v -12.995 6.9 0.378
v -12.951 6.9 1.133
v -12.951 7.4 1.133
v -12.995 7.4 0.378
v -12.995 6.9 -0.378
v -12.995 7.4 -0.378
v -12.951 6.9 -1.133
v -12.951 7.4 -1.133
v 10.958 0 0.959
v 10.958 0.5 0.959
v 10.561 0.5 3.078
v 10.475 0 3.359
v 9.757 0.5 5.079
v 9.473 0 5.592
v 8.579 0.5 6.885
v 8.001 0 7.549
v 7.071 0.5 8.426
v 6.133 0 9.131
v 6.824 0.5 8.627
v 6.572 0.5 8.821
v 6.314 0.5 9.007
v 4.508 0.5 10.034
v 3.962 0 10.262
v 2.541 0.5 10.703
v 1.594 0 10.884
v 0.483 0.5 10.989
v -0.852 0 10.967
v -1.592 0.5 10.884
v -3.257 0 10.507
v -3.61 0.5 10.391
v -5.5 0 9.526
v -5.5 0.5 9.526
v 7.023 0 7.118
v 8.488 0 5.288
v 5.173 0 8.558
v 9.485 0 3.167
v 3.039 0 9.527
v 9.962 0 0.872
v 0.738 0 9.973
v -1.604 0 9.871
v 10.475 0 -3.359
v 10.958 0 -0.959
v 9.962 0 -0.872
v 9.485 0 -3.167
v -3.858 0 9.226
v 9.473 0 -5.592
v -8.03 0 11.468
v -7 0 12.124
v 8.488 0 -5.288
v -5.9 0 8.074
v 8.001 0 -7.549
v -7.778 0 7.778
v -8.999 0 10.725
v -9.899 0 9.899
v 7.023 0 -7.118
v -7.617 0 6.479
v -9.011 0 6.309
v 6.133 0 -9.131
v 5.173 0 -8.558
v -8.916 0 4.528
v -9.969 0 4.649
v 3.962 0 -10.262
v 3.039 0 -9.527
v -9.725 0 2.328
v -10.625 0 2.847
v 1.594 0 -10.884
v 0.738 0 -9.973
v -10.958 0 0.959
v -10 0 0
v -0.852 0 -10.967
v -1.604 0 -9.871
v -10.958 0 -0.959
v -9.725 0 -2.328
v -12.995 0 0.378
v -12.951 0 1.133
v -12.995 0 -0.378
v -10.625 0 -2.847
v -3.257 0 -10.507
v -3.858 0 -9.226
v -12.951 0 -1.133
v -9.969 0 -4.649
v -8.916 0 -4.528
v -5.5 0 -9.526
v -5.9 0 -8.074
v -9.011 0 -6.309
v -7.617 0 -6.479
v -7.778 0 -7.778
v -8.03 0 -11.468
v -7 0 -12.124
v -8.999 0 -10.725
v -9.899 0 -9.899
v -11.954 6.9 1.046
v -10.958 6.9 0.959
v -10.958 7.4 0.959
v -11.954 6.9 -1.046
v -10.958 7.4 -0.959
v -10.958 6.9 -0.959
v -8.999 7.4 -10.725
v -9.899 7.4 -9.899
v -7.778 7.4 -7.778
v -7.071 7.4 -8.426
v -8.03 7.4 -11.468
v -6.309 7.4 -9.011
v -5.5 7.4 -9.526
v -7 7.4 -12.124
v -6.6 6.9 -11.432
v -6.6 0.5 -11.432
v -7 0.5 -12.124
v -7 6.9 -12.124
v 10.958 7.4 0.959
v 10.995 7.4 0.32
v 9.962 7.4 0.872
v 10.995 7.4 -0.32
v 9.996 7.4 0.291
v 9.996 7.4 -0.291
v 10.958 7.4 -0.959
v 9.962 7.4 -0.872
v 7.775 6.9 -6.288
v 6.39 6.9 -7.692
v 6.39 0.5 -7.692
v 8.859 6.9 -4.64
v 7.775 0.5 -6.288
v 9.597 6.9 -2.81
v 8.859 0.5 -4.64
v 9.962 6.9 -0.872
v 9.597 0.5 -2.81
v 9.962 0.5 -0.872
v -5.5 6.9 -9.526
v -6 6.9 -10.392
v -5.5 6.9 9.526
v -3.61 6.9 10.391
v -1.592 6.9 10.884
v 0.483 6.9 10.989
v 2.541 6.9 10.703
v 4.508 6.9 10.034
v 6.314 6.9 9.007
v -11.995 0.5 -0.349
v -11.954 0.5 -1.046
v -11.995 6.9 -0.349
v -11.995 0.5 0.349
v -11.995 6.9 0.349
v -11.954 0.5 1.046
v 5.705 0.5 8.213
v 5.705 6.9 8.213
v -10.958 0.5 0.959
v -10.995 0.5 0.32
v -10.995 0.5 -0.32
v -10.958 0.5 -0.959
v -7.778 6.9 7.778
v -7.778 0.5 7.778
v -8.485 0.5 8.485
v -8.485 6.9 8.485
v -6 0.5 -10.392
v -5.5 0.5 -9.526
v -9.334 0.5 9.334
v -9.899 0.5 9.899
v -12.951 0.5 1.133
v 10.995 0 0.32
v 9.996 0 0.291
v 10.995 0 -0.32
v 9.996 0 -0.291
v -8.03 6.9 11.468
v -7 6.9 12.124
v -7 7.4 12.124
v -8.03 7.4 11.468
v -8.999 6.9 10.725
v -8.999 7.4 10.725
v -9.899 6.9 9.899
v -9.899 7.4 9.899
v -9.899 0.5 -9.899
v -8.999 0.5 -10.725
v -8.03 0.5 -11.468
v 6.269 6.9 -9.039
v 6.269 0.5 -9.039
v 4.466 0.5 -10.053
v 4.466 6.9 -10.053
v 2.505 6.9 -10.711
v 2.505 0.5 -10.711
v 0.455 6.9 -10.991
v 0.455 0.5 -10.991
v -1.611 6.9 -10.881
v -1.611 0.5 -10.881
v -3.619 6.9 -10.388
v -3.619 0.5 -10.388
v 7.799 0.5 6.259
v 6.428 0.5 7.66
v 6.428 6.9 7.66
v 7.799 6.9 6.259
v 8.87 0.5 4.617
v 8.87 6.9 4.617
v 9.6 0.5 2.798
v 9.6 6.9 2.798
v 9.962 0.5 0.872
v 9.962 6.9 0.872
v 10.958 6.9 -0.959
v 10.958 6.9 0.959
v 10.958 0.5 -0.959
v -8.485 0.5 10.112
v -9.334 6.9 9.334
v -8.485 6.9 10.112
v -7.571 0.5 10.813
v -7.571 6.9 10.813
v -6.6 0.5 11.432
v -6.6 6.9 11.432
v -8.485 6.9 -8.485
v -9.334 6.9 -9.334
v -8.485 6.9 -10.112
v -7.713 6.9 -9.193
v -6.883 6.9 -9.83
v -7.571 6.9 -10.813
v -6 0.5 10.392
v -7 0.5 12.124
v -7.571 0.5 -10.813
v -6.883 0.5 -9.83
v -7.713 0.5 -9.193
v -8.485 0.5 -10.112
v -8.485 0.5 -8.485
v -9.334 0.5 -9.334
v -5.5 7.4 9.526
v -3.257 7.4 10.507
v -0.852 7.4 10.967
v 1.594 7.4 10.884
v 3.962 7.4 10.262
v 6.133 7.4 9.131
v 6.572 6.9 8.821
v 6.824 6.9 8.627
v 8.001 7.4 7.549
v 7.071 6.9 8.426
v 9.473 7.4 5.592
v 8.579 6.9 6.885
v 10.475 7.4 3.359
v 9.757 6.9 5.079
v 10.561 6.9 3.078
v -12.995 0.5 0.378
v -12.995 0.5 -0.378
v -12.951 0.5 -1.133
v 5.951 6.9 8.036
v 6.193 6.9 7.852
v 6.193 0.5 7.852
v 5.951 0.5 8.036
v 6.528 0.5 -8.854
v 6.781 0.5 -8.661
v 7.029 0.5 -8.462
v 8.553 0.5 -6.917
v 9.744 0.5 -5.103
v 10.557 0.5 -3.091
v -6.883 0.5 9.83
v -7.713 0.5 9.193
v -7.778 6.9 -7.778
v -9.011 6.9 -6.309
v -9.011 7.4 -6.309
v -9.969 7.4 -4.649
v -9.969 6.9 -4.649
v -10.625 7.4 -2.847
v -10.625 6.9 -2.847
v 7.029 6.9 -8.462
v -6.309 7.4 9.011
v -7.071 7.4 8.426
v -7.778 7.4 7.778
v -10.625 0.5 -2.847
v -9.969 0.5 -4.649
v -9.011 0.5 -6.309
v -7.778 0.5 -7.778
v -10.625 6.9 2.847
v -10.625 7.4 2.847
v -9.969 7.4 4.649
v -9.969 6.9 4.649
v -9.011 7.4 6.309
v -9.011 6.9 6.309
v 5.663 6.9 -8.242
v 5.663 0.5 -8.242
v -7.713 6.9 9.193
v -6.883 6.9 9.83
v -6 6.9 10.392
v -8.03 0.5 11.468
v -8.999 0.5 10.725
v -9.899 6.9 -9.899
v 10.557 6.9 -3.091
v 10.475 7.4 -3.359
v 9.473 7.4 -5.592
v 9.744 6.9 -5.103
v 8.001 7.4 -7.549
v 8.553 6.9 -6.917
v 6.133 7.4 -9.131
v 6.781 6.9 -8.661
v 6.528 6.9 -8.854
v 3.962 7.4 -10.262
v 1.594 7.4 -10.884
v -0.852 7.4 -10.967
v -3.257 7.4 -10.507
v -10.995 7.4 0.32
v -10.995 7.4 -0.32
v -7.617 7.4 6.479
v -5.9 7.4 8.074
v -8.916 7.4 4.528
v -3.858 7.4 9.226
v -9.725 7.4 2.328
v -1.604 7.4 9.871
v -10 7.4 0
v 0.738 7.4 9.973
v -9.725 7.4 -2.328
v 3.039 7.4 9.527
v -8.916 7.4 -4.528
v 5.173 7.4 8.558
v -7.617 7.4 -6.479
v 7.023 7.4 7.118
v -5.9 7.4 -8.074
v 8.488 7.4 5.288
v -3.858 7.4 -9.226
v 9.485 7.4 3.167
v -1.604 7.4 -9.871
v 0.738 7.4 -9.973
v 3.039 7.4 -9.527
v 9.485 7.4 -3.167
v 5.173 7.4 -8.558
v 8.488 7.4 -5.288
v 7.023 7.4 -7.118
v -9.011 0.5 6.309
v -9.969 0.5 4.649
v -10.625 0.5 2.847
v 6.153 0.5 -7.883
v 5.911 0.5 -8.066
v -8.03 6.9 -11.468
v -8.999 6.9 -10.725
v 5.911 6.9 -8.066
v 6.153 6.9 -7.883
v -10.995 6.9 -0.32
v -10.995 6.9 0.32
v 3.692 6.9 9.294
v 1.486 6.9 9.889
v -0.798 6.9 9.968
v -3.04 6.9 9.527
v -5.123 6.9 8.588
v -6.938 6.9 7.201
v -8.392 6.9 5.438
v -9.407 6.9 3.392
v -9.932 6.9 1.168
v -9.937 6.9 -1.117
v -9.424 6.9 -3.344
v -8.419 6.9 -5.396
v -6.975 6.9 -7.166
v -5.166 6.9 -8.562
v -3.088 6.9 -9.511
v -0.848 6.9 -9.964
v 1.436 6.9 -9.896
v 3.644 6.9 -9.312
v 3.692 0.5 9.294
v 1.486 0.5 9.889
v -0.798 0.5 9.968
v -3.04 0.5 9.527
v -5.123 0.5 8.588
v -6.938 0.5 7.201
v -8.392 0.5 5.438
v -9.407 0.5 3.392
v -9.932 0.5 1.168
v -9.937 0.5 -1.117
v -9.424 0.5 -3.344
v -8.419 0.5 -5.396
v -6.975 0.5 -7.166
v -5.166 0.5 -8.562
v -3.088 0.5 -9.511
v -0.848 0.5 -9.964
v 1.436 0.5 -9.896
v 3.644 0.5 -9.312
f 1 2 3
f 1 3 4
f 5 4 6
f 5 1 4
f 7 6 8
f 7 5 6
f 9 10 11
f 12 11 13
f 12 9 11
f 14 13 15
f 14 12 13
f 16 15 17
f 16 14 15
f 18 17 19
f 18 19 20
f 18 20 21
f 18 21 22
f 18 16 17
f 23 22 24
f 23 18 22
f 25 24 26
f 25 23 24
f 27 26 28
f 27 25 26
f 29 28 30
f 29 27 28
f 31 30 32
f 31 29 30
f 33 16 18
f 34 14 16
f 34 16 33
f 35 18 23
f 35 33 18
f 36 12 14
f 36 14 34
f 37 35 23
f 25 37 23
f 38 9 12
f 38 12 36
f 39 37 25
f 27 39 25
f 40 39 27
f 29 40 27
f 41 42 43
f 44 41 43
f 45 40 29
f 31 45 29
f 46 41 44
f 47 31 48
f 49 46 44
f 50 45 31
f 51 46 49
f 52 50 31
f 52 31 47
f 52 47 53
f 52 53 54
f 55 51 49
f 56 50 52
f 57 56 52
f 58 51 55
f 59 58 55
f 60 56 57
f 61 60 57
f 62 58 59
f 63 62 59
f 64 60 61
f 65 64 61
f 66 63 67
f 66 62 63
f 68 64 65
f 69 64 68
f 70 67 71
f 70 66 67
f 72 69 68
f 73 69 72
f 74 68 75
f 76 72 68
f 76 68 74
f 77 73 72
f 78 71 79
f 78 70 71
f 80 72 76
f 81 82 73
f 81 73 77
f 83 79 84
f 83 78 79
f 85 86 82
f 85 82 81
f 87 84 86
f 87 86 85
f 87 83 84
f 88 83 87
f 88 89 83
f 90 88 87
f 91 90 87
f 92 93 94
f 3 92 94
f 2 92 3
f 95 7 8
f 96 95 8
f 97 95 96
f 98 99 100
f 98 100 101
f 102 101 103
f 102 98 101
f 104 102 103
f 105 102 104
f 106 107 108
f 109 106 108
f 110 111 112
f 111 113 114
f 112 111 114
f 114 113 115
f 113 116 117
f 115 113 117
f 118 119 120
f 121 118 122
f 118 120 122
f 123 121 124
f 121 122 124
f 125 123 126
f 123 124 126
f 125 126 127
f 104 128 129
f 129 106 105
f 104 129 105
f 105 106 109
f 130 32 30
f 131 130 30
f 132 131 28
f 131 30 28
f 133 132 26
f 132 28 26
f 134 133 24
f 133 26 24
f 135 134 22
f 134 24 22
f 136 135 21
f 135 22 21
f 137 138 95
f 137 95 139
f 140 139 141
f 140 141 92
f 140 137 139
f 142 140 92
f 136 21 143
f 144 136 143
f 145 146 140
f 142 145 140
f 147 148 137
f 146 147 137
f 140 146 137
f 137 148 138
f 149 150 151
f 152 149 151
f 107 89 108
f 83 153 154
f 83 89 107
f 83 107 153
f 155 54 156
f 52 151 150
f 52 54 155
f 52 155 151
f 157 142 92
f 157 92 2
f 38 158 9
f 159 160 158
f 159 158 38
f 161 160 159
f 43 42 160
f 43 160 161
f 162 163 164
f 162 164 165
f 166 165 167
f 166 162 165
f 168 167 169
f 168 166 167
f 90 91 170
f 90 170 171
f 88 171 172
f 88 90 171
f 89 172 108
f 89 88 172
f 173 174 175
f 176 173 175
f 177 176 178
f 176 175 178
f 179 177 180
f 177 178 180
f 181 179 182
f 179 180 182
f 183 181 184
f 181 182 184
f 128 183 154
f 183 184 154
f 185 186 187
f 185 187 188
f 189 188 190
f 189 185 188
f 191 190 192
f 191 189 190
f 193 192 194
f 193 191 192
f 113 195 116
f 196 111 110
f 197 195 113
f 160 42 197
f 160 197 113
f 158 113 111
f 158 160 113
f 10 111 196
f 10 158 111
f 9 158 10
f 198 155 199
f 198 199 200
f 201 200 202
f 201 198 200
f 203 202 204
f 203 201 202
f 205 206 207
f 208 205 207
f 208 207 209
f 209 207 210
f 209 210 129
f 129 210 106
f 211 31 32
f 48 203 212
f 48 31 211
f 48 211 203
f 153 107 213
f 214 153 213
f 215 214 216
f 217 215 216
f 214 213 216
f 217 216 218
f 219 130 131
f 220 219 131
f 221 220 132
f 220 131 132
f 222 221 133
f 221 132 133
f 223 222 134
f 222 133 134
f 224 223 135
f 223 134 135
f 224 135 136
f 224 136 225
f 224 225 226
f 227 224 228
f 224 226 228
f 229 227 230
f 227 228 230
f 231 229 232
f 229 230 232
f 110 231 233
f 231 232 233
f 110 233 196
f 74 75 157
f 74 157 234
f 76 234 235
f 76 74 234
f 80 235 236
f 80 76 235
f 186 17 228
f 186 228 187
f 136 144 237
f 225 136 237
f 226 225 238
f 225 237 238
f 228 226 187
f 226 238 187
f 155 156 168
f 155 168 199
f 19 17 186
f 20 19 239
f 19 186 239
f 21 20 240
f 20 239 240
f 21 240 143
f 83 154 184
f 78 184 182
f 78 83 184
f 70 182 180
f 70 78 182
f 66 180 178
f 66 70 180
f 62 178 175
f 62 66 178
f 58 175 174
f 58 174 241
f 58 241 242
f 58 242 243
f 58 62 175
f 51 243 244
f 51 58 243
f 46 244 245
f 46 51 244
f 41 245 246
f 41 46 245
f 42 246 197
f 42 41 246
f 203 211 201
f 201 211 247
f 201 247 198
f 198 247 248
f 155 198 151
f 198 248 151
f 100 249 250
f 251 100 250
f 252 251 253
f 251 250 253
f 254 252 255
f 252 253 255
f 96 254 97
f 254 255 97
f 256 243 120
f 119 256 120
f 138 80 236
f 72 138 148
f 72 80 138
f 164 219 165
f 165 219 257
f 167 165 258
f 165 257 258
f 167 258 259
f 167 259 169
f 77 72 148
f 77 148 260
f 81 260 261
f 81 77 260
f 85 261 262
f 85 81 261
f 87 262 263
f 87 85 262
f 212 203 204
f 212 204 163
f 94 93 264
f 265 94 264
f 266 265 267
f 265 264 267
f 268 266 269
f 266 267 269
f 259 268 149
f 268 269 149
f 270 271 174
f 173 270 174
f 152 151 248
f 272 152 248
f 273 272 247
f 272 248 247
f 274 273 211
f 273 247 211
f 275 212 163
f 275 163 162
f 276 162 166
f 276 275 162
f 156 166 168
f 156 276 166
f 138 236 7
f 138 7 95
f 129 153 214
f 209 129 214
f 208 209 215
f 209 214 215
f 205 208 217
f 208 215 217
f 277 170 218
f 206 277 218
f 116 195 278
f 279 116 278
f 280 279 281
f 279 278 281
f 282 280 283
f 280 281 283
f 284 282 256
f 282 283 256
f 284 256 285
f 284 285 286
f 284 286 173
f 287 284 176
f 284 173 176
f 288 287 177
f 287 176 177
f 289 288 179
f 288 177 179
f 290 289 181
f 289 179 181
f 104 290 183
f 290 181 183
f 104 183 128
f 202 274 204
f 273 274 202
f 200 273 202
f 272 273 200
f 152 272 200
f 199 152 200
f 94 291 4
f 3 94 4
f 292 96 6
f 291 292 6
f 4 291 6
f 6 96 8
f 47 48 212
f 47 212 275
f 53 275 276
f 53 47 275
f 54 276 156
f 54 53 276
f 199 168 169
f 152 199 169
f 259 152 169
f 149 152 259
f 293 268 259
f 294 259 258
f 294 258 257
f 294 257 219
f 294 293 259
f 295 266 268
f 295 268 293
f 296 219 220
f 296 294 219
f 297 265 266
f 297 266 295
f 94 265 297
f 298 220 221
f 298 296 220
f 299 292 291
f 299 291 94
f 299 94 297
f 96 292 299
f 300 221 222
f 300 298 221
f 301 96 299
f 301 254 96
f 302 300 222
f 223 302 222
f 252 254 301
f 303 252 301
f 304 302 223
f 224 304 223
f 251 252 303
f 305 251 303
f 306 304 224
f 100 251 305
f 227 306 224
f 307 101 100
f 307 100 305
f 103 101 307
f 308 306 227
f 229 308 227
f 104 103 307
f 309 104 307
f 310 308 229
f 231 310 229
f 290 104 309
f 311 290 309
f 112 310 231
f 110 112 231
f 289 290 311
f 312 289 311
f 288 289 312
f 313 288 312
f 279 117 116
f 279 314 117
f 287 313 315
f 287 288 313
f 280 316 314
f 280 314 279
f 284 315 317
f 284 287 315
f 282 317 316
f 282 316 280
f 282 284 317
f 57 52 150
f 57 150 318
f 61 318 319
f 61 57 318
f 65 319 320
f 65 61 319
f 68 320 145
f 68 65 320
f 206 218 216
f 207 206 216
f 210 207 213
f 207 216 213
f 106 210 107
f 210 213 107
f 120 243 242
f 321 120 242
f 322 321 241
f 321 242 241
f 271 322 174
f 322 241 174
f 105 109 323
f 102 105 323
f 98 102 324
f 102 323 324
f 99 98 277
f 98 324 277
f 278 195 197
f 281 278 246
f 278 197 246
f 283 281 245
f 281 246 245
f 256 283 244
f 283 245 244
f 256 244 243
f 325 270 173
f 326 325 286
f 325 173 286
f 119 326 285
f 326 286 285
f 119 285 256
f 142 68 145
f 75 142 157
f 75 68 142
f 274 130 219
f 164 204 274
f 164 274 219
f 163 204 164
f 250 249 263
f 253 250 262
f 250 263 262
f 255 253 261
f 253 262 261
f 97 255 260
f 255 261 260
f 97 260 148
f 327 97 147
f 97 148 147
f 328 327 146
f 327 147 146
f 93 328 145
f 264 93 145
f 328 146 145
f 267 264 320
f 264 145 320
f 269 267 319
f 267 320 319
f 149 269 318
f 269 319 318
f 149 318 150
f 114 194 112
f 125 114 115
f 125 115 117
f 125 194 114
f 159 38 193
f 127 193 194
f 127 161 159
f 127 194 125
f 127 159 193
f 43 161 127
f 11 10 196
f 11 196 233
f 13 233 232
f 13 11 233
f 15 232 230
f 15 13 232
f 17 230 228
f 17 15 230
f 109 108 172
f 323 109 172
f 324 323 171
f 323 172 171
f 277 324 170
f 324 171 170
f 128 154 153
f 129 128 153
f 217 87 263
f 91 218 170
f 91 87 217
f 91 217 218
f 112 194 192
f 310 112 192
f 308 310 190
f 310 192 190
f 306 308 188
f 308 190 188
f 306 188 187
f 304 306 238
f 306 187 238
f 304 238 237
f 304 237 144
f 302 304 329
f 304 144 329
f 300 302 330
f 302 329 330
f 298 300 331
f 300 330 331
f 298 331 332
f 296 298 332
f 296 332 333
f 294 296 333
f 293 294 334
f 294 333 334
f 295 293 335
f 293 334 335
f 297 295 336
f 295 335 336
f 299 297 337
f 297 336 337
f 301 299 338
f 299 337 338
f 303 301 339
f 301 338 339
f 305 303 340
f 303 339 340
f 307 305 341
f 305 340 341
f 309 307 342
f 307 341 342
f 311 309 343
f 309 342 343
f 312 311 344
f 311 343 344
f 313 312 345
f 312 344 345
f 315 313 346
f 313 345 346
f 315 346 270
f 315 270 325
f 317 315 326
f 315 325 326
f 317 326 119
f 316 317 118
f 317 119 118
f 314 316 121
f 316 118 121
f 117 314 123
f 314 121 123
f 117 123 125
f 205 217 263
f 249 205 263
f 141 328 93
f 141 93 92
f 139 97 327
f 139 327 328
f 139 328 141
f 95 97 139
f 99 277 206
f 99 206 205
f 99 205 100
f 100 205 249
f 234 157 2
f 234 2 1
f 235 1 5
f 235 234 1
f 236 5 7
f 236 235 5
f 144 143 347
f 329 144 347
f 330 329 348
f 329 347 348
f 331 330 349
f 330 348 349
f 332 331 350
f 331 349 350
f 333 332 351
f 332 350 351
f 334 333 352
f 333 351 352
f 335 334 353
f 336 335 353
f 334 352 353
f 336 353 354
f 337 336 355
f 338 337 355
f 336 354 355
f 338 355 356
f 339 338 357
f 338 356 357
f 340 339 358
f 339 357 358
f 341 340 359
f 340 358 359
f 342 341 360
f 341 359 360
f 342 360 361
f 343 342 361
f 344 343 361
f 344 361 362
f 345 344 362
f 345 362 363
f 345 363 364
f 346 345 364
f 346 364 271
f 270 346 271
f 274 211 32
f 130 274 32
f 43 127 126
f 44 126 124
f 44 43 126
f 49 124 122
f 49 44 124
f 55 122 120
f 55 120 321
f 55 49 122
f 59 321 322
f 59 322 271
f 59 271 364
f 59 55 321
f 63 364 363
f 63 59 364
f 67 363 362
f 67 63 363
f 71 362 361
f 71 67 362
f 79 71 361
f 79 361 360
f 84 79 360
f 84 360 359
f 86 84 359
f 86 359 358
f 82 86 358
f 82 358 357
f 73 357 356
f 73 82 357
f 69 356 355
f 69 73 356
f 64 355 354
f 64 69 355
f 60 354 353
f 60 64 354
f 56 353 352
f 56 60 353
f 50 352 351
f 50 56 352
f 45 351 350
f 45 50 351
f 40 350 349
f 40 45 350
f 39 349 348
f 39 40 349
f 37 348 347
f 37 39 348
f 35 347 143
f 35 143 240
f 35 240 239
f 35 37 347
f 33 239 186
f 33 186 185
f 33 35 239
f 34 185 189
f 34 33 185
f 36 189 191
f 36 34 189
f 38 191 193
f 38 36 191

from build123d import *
from build123d.topology import SkipClean

# Parameters (mm, degrees)
EXTRUDE_1_DEPTH = 0.5
EXTRUDE_2_DEPTH = 6.4
EXTRUDE_3_DEPTH = 0.5
EXTRUDE_START   = -7.4
EXTRUDE_6_DEPTH = 7.4
EXTRUDE_7_DEPTH = 6.4
EXTRUDE_8_DEPTH = 0.5


with BuildPart() as part:
    # 草图1 → 凸台-拉伸1 (new body)
    with BuildSketch(Plane(origin=(0, 0, 0), x_dir=(1, 0, 0), z_dir=(0, 1, 0))):
        with BuildLine():
            Line((10.958141679, 0.95871317), (9.961946981, 0.871557427))
            ThreePointArc((9.961946981, 0.871557427), (-10, 0), (9.961946981, -0.871557427))
            Line((9.961946981, -0.871557427), (10.958141679, -0.95871317))
            ThreePointArc((10.958141679, -0.95871317), (5.079234746, -9.757119165), (-5.5, -9.526279442))
            Line((-5.5, -9.526279442), (-7, -12.124355653))
            ThreePointArc((-7, -12.124355653), (-8.522660006, -11.106946764), (-9.899494937, -9.899494937))
            Line((-9.899494937, -9.899494937), (-7.778174593, -7.778174593))
            ThreePointArc((-7.778174593, -7.778174593), (-9.969385657, -4.648800879), (-10.958141679, -0.95871317))
            Line((-10.958141679, -0.95871317), (-12.950531075, -1.133024656))
            ThreePointArc((-12.950531075, -1.133024656), (-13, 0), (-12.950531075, 1.133024656))
            Line((-12.950531075, 1.133024656), (-10.958141679, 0.95871317))
            ThreePointArc((-10.958141679, 0.95871317), (-9.969385657, 4.648800879), (-7.778174593, 7.778174593))
            Line((-7.778174593, 7.778174593), (-9.899494937, 9.899494937))
            ThreePointArc((-9.899494937, 9.899494937), (-8.522660006, 11.106946764), (-7, 12.124355653))
            Line((-7, 12.124355653), (-5.5, 9.526279442))
            ThreePointArc((-5.5, 9.526279442), (5.079234746, 9.757119165), (10.958141679, 0.95871317))
        make_face()
    extrude(amount=EXTRUDE_1_DEPTH)

    # 草图10 → 凸台-拉伸2 (add)
    with BuildSketch(Plane(origin=(0, 0.5, 0), x_dir=(1, 0, 0), z_dir=(0, 1, 0))):
        with BuildLine():
            Line((9.961946981, -0.871557427), (10.958141679, -0.95871317))
            ThreePointArc((10.958141679, -0.95871317), (9.757119165, -5.079234746), (7.070663707, -8.426488874))
            Line((7.070663707, -8.426488874), (6.427876097, -7.660444431))
            ThreePointArc((6.427876097, -7.660444431), (8.870108332, -4.617486132), (9.961946981, -0.871557427))
        make_face()
        with BuildLine():
            Line((9.961946981, 0.871557427), (10.958141679, 0.95871317))
            ThreePointArc((10.958141679, 0.95871317), (9.744466641, 5.103466458), (7.028695203, 8.46152727))
            Line((7.028695203, 8.46152727), (6.389722912, 7.692297518))
            ThreePointArc((6.389722912, 7.692297518), (8.858606037, 4.639514962), (9.961946981, 0.871557427))
        make_face()
        with BuildLine():
            Line((6.314487726, -9.007066379), (5.704869745, -8.213066491))
            ThreePointArc((5.704869745, -8.213066491), (-9.999967824, -0.025367673), (5.663127179, 8.241904547))
            Line((5.663127179, 8.241904547), (6.268753512, 9.038956212))
            ThreePointArc((6.268753512, 9.038956212), (-10.999964675, -0.027877319), (6.314487726, -9.007066379))
        make_face()
    extrude(amount=EXTRUDE_2_DEPTH)

    # 草图11 → 凸台-拉伸3 (add)
    with SkipClean():  # the faces are left unmerged after this step: merging them gives an invalid solid
        with BuildSketch(Plane(origin=(0, 6.9, 0), x_dir=(1, 0, 0), z_dir=(0, 1, 0))):
            with BuildLine():
                Line((9.961946981, 0.871557427), (10.958141679, 0.95871317))
                ThreePointArc((10.958141679, 0.95871317), (-11, 0), (10.958141679, -0.95871317))
                Line((10.958141679, -0.95871317), (9.961946981, -0.871557427))
                ThreePointArc((9.961946981, -0.871557427), (-10, 0), (9.961946981, 0.871557427))
            make_face()
        extrude(amount=EXTRUDE_3_DEPTH)

    # 草图14 → 凸台-拉伸6 (add)
    with SkipClean():  # the faces are left unmerged after this step: merging them gives an invalid solid
        with BuildSketch(Plane(origin=(0, 7.4, 0), x_dir=(1, 0, 0), z_dir=(0, 1, 0)).offset(EXTRUDE_START)):
            with BuildLine():
                Line((9.961946981, 0.871557427), (10.958141679, 0.95871317))
                ThreePointArc((10.958141679, 0.95871317), (11, 0), (10.958141679, -0.95871317))
                Line((10.958141679, -0.95871317), (9.961946981, -0.871557427))
                ThreePointArc((9.961946981, -0.871557427), (10, 0), (9.961946981, 0.871557427))
            make_face()
        extrude(amount=EXTRUDE_6_DEPTH)

    # 草图12 → 凸台-拉伸7 (add)
    with SkipClean():  # the faces are left unmerged after this step: merging them gives an invalid solid
        with BuildSketch(Plane(origin=(0, 0.5, 0), x_dir=(1, 0, 0), z_dir=(0, 1, 0))):
            with BuildLine():
                Line((-7.778174593, -7.778174593), (-8.485281374, -8.485281374))
                ThreePointArc((-8.485281374, -8.485281374), (-7.305137148, -9.520240083), (-6, -10.392304845))
                Line((-6, -10.392304845), (-5.5, -9.526279442))
                ThreePointArc((-5.5, -9.526279442), (-6.696375719, -8.726886743), (-7.778174593, -7.778174593))
            make_face()
            with BuildLine():
                Line((-9.899494937, -9.899494937), (-9.333809512, -9.333809512))
                ThreePointArc((-9.333809512, -9.333809512), (-8.035650863, -10.472264092), (-6.6, -11.43153533))
                Line((-6.6, -11.43153533), (-7, -12.124355653))
                ThreePointArc((-7, -12.124355653), (-8.522660006, -11.106946764), (-9.899494937, -9.899494937))
            make_face()
            with BuildLine():
                Line((-9.899494937, 9.899494937), (-9.333809512, 9.333809512))
                ThreePointArc((-9.333809512, 9.333809512), (-8.035650863, 10.472264092), (-6.6, 11.43153533))
                Line((-6.6, 11.43153533), (-7, 12.124355653))
                ThreePointArc((-7, 12.124355653), (-8.522660006, 11.106946764), (-9.899494937, 9.899494937))
            make_face()
            with BuildLine():
                Line((-5.5, 9.526279442), (-6, 10.392304845))
                ThreePointArc((-6, 10.392304845), (-7.305137148, 9.520240083), (-8.485281374, 8.485281374))
                Line((-8.485281374, 8.485281374), (-7.778174593, 7.778174593))
                ThreePointArc((-7.778174593, 7.778174593), (-6.696375719, 8.726886743), (-5.5, 9.526279442))
            make_face()
            with BuildLine():
                Line((-12.950531075, 1.133024656), (-11.954336377, 1.045868913))
                ThreePointArc((-11.954336377, 1.045868913), (-12, 0), (-11.954336377, -1.045868913))
                Line((-11.954336377, -1.045868913), (-12.950531075, -1.133024656))
                ThreePointArc((-12.950531075, -1.133024656), (-13, 0), (-12.950531075, 1.133024656))
            make_face()
        extrude(amount=EXTRUDE_7_DEPTH)

    # 草图15 → 凸台-拉伸8 (add)
    with SkipClean():  # the faces are left unmerged after this step: merging them gives an invalid solid
        with BuildSketch(Plane(origin=(0, 6.9, 0), x_dir=(1, 0, 0), z_dir=(0, 1, 0))):
            with BuildLine():
                Line((-12.950531075, 1.133024656), (-10.958141679, 0.95871317))
                ThreePointArc((-10.958141679, 0.95871317), (-11, 0), (-10.958141679, -0.95871317))
                Line((-10.958141679, -0.95871317), (-12.950531075, -1.133024656))
                ThreePointArc((-12.950531075, -1.133024656), (-13, 0), (-12.950531075, 1.133024656))
            make_face()
            with BuildLine():
                Line((-9.899494937, -9.899494937), (-7.778174593, -7.778174593))
                ThreePointArc((-7.778174593, -7.778174593), (-6.696375719, -8.726886743), (-5.5, -9.526279442))
                Line((-5.5, -9.526279442), (-7, -12.124355653))
                ThreePointArc((-7, -12.124355653), (-8.522660006, -11.106946764), (-9.899494937, -9.899494937))
            make_face()
            with BuildLine():
                Line((-9.899494937, 9.899494937), (-7.778174593, 7.778174593))
                ThreePointArc((-7.778174593, 7.778174593), (-6.696375719, 8.726886743), (-5.5, 9.526279442))
                Line((-5.5, 9.526279442), (-7, 12.124355653))
                ThreePointArc((-7, 12.124355653), (-8.522660006, 11.106946764), (-9.899494937, 9.899494937))
            make_face()
        extrude(amount=EXTRUDE_8_DEPTH)


solid = part.part
